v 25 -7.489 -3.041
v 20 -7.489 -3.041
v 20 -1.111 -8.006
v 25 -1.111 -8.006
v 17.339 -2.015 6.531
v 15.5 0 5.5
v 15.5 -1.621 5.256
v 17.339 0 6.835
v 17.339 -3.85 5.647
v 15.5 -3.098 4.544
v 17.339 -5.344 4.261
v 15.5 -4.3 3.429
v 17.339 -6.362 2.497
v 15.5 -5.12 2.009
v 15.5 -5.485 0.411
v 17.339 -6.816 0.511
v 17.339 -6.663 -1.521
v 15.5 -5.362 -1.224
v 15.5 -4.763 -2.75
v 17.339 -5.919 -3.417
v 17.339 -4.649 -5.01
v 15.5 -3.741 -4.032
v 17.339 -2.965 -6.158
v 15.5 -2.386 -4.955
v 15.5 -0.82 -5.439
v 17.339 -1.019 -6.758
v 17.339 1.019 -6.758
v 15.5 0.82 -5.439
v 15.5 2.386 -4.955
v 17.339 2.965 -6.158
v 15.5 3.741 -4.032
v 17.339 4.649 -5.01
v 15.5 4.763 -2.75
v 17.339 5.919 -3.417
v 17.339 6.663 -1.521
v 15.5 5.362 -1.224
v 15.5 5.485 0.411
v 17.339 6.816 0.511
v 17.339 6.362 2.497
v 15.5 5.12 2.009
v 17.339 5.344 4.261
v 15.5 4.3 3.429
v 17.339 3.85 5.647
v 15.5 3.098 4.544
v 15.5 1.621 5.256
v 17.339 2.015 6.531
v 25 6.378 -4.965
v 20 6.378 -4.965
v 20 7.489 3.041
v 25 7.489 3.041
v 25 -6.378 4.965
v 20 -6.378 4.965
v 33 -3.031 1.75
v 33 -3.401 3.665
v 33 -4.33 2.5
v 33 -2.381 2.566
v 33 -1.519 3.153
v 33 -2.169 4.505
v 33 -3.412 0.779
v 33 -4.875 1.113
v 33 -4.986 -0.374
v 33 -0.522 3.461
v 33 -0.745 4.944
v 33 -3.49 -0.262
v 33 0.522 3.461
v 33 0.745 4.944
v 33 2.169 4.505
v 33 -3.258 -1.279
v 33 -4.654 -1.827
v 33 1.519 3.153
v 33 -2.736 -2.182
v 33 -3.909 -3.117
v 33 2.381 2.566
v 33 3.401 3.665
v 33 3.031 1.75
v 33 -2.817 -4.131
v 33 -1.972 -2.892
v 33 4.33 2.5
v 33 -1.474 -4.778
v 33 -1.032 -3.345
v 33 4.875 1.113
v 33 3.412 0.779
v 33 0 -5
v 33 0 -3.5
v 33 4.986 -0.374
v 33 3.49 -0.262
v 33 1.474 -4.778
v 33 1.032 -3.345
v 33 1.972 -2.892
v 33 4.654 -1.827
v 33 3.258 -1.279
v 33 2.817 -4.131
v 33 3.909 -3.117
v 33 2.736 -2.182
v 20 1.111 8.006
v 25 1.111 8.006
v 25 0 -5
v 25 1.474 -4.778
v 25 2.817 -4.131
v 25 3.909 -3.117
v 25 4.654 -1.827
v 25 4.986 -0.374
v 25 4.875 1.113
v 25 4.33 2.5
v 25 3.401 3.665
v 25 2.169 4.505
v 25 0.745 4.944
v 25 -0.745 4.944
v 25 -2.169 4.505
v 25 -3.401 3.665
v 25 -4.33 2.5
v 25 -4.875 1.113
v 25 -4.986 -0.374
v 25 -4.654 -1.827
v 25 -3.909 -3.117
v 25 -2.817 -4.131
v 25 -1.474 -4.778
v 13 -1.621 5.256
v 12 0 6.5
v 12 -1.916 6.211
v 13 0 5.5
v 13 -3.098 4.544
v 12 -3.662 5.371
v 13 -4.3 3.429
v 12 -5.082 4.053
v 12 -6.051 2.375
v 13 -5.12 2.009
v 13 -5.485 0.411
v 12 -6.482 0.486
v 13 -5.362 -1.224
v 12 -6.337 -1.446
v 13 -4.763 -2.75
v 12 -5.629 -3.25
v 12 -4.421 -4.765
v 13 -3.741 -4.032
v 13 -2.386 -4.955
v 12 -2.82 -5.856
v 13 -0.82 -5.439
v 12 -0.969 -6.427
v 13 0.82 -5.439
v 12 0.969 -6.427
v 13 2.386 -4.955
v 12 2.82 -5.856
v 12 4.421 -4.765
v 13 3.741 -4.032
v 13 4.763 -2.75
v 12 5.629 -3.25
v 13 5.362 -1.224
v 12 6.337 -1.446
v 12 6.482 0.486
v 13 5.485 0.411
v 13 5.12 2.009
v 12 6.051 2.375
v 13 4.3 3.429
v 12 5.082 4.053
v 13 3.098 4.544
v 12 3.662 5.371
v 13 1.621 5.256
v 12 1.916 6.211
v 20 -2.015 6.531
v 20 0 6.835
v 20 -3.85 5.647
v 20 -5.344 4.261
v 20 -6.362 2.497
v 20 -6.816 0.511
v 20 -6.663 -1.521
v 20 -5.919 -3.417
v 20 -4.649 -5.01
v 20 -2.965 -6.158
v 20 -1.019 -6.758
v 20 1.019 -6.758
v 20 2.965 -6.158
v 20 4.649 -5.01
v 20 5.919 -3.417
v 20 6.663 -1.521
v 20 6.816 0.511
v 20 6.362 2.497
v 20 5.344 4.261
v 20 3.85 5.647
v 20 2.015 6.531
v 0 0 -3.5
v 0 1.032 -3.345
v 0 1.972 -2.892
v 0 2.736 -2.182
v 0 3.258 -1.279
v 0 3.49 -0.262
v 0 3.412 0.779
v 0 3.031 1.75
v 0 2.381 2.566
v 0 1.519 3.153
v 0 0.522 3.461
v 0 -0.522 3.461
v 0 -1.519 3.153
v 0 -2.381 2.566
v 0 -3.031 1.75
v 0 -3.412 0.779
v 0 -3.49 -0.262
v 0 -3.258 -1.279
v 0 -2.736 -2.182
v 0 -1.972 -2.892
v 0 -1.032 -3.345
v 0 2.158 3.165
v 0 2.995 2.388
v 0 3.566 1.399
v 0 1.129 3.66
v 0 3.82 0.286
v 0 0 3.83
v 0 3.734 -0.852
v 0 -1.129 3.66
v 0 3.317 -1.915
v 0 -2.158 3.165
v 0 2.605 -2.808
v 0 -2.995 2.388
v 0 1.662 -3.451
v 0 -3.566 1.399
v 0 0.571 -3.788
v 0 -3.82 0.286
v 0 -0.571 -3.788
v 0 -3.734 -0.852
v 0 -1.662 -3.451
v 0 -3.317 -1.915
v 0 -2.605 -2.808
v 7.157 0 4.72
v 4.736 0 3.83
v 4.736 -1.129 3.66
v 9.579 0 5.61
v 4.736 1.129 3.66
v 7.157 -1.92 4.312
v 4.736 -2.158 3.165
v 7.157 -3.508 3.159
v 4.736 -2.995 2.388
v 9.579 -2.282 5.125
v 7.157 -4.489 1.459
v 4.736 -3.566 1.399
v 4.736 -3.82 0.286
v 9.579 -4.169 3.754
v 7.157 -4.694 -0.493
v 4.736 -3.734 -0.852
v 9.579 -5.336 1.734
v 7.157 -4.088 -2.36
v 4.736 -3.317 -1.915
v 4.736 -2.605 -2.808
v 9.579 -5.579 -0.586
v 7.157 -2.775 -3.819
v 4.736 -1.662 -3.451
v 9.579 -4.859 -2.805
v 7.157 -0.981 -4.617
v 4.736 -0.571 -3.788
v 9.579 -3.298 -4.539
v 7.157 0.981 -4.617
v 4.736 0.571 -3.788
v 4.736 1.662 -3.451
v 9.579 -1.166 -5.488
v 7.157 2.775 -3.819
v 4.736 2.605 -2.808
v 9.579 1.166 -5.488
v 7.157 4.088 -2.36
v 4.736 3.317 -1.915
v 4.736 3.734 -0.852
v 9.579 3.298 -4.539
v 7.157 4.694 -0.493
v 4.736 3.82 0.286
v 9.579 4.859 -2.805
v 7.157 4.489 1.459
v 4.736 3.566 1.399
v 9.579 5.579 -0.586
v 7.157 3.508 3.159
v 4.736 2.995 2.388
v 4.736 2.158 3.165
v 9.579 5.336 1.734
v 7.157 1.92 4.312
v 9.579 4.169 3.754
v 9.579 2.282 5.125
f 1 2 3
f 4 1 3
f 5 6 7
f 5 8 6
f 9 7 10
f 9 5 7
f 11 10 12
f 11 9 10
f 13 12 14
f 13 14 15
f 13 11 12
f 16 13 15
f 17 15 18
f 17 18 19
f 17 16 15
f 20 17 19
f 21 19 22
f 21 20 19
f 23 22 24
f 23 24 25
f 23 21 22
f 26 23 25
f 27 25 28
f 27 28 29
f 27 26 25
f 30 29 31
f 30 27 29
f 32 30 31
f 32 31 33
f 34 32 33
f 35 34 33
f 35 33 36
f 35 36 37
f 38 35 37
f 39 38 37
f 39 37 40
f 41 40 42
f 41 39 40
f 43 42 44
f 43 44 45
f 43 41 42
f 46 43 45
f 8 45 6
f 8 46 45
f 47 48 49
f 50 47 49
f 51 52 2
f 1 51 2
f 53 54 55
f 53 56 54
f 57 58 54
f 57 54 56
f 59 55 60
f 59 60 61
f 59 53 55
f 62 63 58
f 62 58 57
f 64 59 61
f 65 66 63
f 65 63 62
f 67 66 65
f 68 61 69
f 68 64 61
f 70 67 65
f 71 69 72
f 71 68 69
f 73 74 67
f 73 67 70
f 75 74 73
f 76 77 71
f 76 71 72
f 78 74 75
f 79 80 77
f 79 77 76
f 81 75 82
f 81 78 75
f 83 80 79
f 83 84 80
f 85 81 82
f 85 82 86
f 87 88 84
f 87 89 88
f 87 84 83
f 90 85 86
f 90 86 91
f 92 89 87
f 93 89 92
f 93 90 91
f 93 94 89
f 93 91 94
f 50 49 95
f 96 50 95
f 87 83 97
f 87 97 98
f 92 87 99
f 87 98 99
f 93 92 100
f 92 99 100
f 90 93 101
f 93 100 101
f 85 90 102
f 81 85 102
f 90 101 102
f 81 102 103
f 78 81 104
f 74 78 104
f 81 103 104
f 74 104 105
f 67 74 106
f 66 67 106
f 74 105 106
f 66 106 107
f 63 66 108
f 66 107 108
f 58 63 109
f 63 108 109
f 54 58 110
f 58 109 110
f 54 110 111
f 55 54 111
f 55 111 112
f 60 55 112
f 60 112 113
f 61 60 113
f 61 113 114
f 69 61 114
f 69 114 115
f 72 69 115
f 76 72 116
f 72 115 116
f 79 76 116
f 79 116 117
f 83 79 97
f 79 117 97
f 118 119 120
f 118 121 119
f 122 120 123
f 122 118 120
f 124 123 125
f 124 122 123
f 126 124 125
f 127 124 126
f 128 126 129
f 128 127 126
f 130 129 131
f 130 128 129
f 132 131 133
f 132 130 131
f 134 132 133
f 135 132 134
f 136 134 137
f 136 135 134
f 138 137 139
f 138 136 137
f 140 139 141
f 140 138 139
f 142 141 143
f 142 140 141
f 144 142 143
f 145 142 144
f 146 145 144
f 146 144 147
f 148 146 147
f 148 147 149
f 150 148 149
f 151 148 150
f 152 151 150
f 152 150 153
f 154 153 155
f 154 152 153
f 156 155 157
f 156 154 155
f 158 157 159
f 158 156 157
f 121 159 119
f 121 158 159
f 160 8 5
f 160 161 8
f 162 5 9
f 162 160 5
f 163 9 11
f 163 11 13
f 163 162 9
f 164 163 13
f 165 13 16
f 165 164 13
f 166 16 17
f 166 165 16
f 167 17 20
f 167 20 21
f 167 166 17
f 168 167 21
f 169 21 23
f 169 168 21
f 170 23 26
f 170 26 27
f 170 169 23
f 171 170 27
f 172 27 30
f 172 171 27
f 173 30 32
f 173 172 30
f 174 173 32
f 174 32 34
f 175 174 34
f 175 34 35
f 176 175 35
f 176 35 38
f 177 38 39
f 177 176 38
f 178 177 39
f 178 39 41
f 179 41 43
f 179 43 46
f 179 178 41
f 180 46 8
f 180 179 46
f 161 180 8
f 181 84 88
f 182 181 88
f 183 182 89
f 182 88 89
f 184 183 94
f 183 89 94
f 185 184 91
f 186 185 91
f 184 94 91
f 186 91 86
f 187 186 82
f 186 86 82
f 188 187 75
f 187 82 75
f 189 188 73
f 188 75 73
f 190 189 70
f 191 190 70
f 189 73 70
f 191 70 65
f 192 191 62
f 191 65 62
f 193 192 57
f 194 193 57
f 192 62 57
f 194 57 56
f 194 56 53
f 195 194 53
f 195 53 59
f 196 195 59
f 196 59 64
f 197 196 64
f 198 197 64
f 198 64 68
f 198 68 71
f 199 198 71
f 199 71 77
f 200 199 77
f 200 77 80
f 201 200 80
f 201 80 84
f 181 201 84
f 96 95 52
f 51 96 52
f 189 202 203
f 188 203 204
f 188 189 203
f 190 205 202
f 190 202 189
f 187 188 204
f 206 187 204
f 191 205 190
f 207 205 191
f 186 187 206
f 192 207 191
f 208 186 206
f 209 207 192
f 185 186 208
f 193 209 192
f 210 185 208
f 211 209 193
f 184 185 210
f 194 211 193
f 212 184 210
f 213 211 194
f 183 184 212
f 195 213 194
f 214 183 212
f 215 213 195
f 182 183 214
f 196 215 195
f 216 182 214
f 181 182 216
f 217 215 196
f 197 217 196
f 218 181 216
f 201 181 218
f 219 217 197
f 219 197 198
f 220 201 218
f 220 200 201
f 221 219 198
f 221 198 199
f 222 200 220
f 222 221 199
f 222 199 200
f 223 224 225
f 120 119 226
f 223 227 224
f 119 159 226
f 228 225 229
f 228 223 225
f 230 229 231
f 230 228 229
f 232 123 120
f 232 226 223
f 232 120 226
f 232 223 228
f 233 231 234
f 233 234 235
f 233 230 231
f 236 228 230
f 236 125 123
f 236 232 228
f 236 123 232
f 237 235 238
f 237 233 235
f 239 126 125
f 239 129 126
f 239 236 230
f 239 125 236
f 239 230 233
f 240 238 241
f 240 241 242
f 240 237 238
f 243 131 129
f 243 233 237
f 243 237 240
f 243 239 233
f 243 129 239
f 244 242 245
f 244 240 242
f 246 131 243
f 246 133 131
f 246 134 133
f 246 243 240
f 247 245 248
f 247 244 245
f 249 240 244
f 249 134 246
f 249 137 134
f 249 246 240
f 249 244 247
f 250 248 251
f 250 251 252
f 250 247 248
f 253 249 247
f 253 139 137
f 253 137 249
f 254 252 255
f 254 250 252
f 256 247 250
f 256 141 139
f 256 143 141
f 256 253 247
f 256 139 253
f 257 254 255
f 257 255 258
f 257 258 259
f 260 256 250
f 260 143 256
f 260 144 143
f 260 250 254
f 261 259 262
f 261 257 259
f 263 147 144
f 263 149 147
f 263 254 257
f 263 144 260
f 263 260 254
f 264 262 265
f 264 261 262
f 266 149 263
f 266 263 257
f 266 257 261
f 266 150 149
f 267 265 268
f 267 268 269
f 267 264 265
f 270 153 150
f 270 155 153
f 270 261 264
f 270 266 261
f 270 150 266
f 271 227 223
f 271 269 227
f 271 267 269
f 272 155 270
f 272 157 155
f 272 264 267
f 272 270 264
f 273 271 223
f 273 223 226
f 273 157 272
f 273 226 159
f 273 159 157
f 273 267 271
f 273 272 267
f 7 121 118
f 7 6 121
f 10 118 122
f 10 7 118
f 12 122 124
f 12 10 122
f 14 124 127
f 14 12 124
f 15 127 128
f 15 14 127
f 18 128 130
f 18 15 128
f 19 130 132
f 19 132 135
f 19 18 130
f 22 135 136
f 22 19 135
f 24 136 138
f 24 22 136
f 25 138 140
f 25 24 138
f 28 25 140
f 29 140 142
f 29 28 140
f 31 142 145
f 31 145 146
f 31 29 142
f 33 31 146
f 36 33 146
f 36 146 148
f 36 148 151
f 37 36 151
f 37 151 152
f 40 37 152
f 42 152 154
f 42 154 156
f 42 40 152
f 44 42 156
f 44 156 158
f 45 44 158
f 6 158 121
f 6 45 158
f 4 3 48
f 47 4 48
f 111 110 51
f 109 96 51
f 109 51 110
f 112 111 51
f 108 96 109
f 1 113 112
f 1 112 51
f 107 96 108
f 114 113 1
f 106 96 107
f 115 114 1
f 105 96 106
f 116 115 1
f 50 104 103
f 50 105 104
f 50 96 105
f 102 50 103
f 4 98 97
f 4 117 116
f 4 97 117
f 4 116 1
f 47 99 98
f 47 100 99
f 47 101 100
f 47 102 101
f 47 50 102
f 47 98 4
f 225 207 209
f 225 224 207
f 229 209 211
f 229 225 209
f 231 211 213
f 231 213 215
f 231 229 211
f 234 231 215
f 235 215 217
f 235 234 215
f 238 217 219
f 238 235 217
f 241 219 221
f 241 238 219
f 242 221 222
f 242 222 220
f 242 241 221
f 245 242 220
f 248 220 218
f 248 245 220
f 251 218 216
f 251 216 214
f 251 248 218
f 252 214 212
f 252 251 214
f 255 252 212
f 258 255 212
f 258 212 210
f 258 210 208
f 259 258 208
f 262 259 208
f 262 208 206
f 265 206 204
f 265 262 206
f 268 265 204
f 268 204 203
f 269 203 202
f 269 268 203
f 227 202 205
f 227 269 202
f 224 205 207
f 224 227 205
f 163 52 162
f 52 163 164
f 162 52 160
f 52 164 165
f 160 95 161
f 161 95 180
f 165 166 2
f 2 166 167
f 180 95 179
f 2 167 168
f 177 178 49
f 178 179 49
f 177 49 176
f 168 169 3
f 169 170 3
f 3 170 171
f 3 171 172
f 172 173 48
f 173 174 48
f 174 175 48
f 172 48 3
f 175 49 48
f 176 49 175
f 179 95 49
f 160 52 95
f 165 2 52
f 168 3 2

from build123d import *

# Parameters (mm, degrees)
EXTRUDE_1_DEPTH     = 5
SKETCH_3_R          = 5
EXTRUDE_2_DEPTH     = 8
SKETCH_4_R          = 3.5
CUT_EXTRUDE_3_DEPTH = 35.773353009


with BuildPart() as part:
    # 草图1 → 旋转1 (revolve)
    with BuildSketch(Plane(origin=(0, 0, 0), x_dir=(1, 0, 0), z_dir=(0, 1, 0)), mode=Mode.PRIVATE) as revolve_1_sk:
        Polygon((0, 3.047961053), (0, 3.83046551), (4.735897553, 3.83046551), (12, 6.5), (13, 5.5), (15.5, 5.5), (17.339013278, 6.834767245), (20, 6.834767245), (20, 3.417383623), align=None)
    revolve(revolve_1_sk.sketch.rotate(Axis((0, 0, 0), (1, 0, 0)), 180), axis=Axis((0, 0, 0), (1, 0, 0)))

    # 草图2 → 拉伸1 (add)
    with BuildSketch(Plane(origin=(20, 0, 0), x_dir=(0, 0, -1), z_dir=(1, 0, 0))):
        Polygon((8.006144159, -1.111300607), (4.965486636, 6.377873924), (-3.040657522, 7.489174532), (-8.006144159, 1.111300607), (-4.965486636, -6.377873924), (3.040657522, -7.489174532), align=None)
    extrude(amount=EXTRUDE_1_DEPTH)

    # 草图3 → 拉伸2 (add)
    with BuildSketch(Plane(origin=(25, 0, 0), x_dir=(0, 0, -1), z_dir=(1, 0, 0))):
        Circle(SKETCH_3_R)
    extrude(amount=EXTRUDE_2_DEPTH)

    # 草图4 → 拉伸3 (cut, through all)
    with BuildSketch(Plane(origin=(33, 0, 0), x_dir=(0, 0, -1), z_dir=(1, 0, 0))):
        Circle(SKETCH_4_R)
    extrude(amount=-CUT_EXTRUDE_3_DEPTH, mode=Mode.SUBTRACT)


solid = part.part
